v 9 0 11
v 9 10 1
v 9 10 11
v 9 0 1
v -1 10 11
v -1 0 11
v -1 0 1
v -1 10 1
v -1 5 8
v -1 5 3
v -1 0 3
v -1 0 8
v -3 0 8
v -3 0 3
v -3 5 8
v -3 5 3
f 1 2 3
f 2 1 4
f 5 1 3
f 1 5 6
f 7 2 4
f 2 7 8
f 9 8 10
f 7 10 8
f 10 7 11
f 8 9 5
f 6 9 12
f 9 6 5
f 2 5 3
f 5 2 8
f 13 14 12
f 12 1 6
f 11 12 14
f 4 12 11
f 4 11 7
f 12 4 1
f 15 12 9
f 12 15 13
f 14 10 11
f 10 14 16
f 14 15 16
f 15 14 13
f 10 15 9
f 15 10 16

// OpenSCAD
//the root tree contains 2 non sense comment(s)

union() {
	//non sense comment
	color(c = "red") {
		translate(v = [0, 0, 1]) {
			translate(v = [-1, 0, 0]) {
				cube(size = 10);
			}
		}
	}
	//non sense comment
	color(c = "red") {
		translate(v = [0, 0, 3]) {
			translate(v = [-3, 0, 0]) {
				cube(size = 5);
			}
		}
	}
}
